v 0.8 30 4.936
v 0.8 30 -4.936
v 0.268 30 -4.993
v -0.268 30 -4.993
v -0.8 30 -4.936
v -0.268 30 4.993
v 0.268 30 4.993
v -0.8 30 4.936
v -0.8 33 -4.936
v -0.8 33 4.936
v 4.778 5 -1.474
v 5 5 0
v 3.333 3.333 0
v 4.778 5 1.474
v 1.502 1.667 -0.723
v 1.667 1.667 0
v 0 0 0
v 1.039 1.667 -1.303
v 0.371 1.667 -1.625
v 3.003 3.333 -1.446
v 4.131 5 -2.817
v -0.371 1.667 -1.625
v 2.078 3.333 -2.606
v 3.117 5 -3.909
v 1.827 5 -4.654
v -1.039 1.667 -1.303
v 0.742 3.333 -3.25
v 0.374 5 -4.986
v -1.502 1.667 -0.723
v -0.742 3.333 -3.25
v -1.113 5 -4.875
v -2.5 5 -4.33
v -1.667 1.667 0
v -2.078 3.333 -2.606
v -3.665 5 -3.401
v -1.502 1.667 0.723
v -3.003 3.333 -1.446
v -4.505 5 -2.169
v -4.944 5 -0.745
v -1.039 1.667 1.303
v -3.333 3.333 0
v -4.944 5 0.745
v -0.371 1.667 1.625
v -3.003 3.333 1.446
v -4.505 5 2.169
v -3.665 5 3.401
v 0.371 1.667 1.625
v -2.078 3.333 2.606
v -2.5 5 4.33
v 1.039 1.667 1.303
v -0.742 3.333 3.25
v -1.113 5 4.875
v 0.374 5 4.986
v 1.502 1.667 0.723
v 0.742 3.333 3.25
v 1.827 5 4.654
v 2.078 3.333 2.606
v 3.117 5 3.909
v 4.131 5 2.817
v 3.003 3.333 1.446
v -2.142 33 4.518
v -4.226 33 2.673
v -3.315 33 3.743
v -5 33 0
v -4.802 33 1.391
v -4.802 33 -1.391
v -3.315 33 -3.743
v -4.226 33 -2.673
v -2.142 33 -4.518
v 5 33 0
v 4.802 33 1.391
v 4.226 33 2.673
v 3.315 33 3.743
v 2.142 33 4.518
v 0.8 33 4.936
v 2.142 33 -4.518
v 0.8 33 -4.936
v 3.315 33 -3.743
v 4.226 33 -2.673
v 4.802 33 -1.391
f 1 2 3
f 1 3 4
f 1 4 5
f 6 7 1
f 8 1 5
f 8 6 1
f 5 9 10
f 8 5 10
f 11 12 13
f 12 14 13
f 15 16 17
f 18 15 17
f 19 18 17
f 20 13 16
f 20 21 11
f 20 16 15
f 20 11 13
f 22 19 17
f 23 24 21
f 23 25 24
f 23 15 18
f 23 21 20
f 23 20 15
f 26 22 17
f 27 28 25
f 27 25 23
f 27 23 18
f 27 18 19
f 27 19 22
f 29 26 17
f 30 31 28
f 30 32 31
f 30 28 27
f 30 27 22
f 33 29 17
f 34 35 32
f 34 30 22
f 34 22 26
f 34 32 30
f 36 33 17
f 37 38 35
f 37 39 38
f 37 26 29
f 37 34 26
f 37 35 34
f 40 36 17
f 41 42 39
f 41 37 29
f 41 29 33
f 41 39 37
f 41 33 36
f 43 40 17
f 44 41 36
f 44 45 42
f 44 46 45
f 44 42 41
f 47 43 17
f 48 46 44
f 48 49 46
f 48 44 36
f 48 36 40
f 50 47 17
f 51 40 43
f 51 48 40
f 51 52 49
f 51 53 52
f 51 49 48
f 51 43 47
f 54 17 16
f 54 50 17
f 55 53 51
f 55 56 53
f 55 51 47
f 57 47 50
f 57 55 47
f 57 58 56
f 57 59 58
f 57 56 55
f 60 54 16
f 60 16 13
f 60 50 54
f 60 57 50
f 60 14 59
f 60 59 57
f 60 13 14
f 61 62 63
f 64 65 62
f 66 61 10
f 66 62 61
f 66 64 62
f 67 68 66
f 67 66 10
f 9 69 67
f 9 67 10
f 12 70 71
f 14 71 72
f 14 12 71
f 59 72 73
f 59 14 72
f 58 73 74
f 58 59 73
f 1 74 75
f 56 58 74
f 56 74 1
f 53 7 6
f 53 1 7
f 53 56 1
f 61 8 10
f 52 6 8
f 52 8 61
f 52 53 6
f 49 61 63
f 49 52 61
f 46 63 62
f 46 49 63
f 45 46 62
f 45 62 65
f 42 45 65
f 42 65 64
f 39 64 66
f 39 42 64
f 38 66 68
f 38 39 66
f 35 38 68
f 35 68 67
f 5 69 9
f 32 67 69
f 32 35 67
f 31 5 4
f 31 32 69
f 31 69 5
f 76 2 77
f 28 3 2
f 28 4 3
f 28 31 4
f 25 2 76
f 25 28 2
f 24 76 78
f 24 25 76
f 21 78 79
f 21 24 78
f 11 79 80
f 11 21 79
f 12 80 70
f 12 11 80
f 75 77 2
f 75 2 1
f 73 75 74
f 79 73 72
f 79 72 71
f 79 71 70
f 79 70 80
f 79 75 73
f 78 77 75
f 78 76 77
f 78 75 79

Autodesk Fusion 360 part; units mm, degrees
sketch "Sketch1" plane through (0, 0, 0) normal (0, 1, 0) x (1, 0, 0)
  circle A0 centre (0, 0) radius 5
  dimension "d1" = 10
extrude "Extrude1" add sketch "Sketch1" along normal blind 33
chamfer "Chamfer1" distance 5 angle 45 1 edges at (-4.6616, 0, 1.8081)
ref_plane "WorkPlane1" through (0, 0, -5) normal (0, 0, 1) x (1, 0, 0)
sketch "Sketch2" plane through (0, 0, -5) normal (0, 0, 1) x (1, 0, 0)
sketch "Sketch3" plane through (0, 33, 0) normal (0, 1, 0) x (-1, 0, 0)
  circle A0 centre (0, 0) radius 5
  line L0 (0, 0) -> (0.8, 0)
  line L1 (0, 0) -> (-0.8, 0)
  line L2 (-0.8, 0) -> (-0.8, 5.3819)
  line L3 (0.8, 0) -> (0.8, 5.3174)
  line L4 (0.8, 5.3174) -> (-0.8, 5.3819)
  line L5 (0.8, 0) -> (0.8, -5.6853)
  line L6 (-0.8, 0) -> (-0.8, -5.7176)
  line L7 (-0.8, -5.7176) -> (0.8, -5.6853)
  dimension "d6" = 0.8
  dimension "d7" = 0.8
extrude "Extrude2" cut sketch "Sketch3" against normal blind 3 contours A0 L0 L1 L2 L3 | A0 L0 L1 L5 L6
